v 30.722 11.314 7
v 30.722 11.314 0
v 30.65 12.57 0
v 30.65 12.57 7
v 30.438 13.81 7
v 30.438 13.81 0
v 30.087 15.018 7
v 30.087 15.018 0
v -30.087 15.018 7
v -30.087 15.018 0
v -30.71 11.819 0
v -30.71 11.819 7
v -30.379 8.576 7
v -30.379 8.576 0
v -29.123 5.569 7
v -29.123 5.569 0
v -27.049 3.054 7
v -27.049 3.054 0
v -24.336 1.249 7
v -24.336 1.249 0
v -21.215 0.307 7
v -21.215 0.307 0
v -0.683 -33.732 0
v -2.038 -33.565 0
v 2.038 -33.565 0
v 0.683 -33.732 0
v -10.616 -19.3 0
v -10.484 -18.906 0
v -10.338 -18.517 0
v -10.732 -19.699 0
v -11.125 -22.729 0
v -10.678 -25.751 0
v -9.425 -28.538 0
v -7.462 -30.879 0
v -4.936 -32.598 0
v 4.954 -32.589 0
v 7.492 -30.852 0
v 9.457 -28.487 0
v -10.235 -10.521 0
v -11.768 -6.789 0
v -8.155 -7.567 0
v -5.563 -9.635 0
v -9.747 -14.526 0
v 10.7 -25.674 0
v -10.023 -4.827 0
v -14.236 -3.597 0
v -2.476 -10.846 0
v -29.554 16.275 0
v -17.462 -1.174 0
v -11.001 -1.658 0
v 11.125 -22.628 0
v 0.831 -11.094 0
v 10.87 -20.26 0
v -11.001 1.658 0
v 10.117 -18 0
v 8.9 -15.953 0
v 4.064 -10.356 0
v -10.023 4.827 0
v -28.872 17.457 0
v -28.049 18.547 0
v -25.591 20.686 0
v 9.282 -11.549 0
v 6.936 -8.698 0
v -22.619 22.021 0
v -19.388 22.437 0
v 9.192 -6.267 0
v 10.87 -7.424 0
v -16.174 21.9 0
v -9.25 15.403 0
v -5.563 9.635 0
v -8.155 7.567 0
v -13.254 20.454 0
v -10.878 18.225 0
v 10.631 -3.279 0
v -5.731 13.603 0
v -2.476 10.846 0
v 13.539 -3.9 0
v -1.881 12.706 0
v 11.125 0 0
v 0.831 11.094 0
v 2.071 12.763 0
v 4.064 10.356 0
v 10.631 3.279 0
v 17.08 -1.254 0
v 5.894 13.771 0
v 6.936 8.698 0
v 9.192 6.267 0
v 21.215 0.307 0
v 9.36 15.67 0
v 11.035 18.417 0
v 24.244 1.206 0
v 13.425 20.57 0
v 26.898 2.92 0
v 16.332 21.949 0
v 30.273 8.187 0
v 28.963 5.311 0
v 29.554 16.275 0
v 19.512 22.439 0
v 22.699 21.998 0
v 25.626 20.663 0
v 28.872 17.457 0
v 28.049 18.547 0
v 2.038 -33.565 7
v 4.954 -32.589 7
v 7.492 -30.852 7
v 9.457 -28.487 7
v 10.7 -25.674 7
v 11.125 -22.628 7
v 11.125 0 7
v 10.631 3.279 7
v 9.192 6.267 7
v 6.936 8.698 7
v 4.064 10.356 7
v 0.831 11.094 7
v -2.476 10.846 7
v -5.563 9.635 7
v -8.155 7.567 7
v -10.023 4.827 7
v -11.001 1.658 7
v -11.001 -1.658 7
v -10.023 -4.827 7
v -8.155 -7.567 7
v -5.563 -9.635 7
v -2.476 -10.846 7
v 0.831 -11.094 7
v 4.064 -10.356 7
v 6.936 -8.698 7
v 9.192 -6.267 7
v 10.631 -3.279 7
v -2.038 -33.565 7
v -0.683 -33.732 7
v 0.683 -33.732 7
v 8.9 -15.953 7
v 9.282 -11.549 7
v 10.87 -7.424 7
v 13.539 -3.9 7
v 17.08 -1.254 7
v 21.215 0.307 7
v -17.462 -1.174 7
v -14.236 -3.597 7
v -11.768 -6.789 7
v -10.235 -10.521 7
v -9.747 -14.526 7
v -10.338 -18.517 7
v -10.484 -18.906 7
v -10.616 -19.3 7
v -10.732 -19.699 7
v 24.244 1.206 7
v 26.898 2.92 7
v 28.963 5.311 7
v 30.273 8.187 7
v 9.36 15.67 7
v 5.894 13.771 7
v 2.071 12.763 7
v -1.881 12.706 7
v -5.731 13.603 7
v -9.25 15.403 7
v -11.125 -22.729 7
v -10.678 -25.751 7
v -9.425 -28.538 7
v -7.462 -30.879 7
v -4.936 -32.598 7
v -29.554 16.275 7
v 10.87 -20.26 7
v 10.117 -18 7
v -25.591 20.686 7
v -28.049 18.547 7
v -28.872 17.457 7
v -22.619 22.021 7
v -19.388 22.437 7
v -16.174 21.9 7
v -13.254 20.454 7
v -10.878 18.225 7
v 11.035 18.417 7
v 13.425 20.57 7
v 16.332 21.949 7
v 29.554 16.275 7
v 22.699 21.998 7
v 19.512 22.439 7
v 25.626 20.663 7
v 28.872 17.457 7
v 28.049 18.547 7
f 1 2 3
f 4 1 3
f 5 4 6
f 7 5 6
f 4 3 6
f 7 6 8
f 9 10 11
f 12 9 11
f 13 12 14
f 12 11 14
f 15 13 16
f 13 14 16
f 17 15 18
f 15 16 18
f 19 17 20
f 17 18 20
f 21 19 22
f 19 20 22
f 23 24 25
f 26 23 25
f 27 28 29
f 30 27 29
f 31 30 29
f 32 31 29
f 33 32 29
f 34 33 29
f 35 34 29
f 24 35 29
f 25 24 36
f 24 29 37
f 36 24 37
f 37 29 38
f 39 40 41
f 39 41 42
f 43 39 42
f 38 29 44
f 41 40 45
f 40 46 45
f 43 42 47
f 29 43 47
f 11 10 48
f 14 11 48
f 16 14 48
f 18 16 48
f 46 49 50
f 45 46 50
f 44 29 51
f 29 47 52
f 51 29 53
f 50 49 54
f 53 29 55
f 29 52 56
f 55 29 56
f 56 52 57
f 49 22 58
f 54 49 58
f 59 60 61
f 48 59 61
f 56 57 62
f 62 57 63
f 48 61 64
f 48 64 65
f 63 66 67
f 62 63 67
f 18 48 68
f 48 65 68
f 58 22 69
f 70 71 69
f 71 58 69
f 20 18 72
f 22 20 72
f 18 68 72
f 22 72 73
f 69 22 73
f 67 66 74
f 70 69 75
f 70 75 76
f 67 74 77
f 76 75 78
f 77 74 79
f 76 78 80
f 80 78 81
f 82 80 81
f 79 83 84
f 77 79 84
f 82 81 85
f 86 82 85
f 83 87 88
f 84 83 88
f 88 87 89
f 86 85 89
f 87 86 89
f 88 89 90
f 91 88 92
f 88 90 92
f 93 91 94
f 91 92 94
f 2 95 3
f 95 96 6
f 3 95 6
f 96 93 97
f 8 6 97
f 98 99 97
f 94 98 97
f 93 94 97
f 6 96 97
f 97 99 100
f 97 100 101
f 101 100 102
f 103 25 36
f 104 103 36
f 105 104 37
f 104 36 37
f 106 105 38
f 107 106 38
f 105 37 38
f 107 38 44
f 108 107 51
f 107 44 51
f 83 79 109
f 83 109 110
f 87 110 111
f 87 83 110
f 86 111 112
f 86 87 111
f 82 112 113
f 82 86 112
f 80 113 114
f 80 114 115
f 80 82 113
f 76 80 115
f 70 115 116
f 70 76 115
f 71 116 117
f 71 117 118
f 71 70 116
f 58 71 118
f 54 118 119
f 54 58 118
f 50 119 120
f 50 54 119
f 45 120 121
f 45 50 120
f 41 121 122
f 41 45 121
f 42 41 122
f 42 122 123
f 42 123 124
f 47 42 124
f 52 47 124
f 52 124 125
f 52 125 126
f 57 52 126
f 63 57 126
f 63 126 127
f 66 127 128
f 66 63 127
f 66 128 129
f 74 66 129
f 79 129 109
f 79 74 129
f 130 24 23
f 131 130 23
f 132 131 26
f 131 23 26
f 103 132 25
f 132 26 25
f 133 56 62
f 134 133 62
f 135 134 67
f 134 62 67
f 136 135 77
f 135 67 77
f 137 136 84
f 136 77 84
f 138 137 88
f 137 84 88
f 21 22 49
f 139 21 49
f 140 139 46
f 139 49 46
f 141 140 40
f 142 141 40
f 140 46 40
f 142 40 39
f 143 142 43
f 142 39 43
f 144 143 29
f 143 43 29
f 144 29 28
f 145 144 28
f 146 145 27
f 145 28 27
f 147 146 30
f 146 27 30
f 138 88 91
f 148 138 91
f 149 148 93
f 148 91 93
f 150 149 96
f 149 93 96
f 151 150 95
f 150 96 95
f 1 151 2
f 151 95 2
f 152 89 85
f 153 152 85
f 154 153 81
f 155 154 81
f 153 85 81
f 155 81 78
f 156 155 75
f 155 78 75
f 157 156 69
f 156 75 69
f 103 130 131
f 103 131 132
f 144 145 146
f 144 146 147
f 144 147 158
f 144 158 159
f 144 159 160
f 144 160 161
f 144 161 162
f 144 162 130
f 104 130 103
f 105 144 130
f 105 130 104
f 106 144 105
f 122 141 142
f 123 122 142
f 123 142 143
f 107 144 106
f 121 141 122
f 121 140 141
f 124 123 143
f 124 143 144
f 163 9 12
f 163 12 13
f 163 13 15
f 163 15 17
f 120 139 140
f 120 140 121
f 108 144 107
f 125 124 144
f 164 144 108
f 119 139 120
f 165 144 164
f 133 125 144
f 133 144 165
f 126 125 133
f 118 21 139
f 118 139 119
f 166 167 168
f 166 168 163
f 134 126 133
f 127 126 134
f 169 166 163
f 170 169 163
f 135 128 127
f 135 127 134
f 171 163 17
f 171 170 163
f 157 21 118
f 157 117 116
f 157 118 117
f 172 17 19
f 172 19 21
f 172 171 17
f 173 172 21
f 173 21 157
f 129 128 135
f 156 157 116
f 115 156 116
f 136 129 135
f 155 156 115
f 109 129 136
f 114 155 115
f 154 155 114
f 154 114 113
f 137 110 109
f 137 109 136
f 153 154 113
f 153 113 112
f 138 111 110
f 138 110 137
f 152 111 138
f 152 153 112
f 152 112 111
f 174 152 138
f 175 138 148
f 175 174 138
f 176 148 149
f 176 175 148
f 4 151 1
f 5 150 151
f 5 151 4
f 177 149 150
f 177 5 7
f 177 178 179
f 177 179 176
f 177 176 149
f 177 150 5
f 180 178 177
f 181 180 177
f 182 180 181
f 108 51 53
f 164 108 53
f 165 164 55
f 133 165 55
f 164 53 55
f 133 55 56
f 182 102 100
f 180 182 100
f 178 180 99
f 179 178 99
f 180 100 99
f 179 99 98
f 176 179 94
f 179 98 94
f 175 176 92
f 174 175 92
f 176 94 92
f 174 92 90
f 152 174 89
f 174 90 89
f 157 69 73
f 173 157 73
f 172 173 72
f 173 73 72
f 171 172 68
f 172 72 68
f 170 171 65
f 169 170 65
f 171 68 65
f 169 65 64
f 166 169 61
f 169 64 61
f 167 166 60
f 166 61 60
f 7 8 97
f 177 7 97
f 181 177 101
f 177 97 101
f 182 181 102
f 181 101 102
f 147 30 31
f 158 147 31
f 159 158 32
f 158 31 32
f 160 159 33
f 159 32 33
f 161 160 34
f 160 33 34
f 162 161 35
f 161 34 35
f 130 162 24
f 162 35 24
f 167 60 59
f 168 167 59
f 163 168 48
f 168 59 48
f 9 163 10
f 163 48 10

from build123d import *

# Parameters (mm, degrees)
F0_R     = 11.125
F1_DEPTH = 7


with BuildPart() as f1:
    # F0 (on Top) → F1 (new body)
    with BuildSketch(Plane.XY):
        with BuildLine():
            ThreePointArc((2.037572, -33.564942), (8.556682, -29.737896), (11.125, -22.628127))
            ThreePointArc((11.125, -22.628127), (10.55403, -19.109877), (8.899727, -15.952762))
            ThreePointArc((8.899727, -15.952762), (-1.46999, -11.600672), (-10.337576, -18.517148))
            ThreePointArc((-10.337576, -18.517148), (-10.522788, -19.112066), (-10.732419, -19.698825))
            ThreePointArc((-10.732419, -19.698825), (-9.425257, -28.538301), (-2.037572, -33.564942))
            ThreePointArc((-2.037572, -33.564942), (0, -33.626731), (2.037572, -33.564942))
        make_face()
        with BuildLine():
            ThreePointArc((-10.337576, -18.517148), (-1.46999, -11.600672), (8.899727, -15.952762))
            ThreePointArc((8.899727, -15.952762), (12.080882, -5.568253), (21.215107, 0.307436))
            ThreePointArc((21.215107, 0.307436), (10.78902, 4.517495), (9.359899, 15.670319))
            ThreePointArc((9.359899, 15.670319), (0.096944, 12.613685), (-9.250085, 15.402663))
            ThreePointArc((-9.250085, 15.402663), (-8.667904, 13.395096), (-8.471533, 11.314063))
            ThreePointArc((-8.471533, 11.314063), (-12.324704, 2.894673), (-21.215107, 0.307436))
            ThreePointArc((-21.215107, 0.307436), (-11.768489, -6.788973), (-10.337576, -18.517148))
        make_face()
        Circle(F0_R, mode=Mode.SUBTRACT)
        with BuildLine():
            ThreePointArc((-2.037572, -33.564942), (0, -33.753127), (2.037572, -33.564942))
            ThreePointArc((2.037572, -33.564942), (0, -33.626731), (-2.037572, -33.564942))
        make_face()
        with BuildLine():
            ThreePointArc((-10.732419, -19.698825), (-10.522788, -19.112066), (-10.337576, -18.517148))
            ThreePointArc((-10.337576, -18.517148), (-10.551553, -19.102455), (-10.732419, -19.698825))
        make_face()
        with BuildLine():
            ThreePointArc((9.359899, 15.670319), (10.78902, 4.517495), (21.215107, 0.307436))
            ThreePointArc((21.215107, 0.307436), (28.015923, 4.042235), (30.721533, 11.314063))
            ThreePointArc((30.721533, 11.314063), (30.561721, 13.192963), (30.086878, 15.017882))
            ThreePointArc((30.086878, 15.017882), (29.121603, 16.813365), (28.049307, 18.54706))
            ThreePointArc((28.049307, 18.54706), (17.904065, 22.30957), (9.359899, 15.670319))
        make_face()
        with BuildLine():
            ThreePointArc((-30.086878, 15.017882), (-29.123116, 5.568645), (-21.215107, 0.307436))
            ThreePointArc((-21.215107, 0.307436), (-12.324704, 2.894673), (-8.471533, 11.314063))
            ThreePointArc((-8.471533, 11.314063), (-8.667904, 13.395096), (-9.250085, 15.402663))
            ThreePointArc((-9.250085, 15.402663), (-17.761238, 22.286634), (-28.049307, 18.54706))
            ThreePointArc((-28.049307, 18.54706), (-29.121603, 16.813365), (-30.086878, 15.017882))
        make_face()
        with BuildLine():
            ThreePointArc((-28.049307, 18.54706), (-29.231065, 16.876563), (-30.086878, 15.017882))
            ThreePointArc((-30.086878, 15.017882), (-29.121603, 16.813365), (-28.049307, 18.54706))
        make_face()
        with BuildLine():
            ThreePointArc((30.086878, 15.017882), (29.231065, 16.876563), (28.049307, 18.54706))
            ThreePointArc((28.049307, 18.54706), (29.121603, 16.813365), (30.086878, 15.017882))
        make_face()
    extrude(amount=F1_DEPTH)


solid = f1.part
